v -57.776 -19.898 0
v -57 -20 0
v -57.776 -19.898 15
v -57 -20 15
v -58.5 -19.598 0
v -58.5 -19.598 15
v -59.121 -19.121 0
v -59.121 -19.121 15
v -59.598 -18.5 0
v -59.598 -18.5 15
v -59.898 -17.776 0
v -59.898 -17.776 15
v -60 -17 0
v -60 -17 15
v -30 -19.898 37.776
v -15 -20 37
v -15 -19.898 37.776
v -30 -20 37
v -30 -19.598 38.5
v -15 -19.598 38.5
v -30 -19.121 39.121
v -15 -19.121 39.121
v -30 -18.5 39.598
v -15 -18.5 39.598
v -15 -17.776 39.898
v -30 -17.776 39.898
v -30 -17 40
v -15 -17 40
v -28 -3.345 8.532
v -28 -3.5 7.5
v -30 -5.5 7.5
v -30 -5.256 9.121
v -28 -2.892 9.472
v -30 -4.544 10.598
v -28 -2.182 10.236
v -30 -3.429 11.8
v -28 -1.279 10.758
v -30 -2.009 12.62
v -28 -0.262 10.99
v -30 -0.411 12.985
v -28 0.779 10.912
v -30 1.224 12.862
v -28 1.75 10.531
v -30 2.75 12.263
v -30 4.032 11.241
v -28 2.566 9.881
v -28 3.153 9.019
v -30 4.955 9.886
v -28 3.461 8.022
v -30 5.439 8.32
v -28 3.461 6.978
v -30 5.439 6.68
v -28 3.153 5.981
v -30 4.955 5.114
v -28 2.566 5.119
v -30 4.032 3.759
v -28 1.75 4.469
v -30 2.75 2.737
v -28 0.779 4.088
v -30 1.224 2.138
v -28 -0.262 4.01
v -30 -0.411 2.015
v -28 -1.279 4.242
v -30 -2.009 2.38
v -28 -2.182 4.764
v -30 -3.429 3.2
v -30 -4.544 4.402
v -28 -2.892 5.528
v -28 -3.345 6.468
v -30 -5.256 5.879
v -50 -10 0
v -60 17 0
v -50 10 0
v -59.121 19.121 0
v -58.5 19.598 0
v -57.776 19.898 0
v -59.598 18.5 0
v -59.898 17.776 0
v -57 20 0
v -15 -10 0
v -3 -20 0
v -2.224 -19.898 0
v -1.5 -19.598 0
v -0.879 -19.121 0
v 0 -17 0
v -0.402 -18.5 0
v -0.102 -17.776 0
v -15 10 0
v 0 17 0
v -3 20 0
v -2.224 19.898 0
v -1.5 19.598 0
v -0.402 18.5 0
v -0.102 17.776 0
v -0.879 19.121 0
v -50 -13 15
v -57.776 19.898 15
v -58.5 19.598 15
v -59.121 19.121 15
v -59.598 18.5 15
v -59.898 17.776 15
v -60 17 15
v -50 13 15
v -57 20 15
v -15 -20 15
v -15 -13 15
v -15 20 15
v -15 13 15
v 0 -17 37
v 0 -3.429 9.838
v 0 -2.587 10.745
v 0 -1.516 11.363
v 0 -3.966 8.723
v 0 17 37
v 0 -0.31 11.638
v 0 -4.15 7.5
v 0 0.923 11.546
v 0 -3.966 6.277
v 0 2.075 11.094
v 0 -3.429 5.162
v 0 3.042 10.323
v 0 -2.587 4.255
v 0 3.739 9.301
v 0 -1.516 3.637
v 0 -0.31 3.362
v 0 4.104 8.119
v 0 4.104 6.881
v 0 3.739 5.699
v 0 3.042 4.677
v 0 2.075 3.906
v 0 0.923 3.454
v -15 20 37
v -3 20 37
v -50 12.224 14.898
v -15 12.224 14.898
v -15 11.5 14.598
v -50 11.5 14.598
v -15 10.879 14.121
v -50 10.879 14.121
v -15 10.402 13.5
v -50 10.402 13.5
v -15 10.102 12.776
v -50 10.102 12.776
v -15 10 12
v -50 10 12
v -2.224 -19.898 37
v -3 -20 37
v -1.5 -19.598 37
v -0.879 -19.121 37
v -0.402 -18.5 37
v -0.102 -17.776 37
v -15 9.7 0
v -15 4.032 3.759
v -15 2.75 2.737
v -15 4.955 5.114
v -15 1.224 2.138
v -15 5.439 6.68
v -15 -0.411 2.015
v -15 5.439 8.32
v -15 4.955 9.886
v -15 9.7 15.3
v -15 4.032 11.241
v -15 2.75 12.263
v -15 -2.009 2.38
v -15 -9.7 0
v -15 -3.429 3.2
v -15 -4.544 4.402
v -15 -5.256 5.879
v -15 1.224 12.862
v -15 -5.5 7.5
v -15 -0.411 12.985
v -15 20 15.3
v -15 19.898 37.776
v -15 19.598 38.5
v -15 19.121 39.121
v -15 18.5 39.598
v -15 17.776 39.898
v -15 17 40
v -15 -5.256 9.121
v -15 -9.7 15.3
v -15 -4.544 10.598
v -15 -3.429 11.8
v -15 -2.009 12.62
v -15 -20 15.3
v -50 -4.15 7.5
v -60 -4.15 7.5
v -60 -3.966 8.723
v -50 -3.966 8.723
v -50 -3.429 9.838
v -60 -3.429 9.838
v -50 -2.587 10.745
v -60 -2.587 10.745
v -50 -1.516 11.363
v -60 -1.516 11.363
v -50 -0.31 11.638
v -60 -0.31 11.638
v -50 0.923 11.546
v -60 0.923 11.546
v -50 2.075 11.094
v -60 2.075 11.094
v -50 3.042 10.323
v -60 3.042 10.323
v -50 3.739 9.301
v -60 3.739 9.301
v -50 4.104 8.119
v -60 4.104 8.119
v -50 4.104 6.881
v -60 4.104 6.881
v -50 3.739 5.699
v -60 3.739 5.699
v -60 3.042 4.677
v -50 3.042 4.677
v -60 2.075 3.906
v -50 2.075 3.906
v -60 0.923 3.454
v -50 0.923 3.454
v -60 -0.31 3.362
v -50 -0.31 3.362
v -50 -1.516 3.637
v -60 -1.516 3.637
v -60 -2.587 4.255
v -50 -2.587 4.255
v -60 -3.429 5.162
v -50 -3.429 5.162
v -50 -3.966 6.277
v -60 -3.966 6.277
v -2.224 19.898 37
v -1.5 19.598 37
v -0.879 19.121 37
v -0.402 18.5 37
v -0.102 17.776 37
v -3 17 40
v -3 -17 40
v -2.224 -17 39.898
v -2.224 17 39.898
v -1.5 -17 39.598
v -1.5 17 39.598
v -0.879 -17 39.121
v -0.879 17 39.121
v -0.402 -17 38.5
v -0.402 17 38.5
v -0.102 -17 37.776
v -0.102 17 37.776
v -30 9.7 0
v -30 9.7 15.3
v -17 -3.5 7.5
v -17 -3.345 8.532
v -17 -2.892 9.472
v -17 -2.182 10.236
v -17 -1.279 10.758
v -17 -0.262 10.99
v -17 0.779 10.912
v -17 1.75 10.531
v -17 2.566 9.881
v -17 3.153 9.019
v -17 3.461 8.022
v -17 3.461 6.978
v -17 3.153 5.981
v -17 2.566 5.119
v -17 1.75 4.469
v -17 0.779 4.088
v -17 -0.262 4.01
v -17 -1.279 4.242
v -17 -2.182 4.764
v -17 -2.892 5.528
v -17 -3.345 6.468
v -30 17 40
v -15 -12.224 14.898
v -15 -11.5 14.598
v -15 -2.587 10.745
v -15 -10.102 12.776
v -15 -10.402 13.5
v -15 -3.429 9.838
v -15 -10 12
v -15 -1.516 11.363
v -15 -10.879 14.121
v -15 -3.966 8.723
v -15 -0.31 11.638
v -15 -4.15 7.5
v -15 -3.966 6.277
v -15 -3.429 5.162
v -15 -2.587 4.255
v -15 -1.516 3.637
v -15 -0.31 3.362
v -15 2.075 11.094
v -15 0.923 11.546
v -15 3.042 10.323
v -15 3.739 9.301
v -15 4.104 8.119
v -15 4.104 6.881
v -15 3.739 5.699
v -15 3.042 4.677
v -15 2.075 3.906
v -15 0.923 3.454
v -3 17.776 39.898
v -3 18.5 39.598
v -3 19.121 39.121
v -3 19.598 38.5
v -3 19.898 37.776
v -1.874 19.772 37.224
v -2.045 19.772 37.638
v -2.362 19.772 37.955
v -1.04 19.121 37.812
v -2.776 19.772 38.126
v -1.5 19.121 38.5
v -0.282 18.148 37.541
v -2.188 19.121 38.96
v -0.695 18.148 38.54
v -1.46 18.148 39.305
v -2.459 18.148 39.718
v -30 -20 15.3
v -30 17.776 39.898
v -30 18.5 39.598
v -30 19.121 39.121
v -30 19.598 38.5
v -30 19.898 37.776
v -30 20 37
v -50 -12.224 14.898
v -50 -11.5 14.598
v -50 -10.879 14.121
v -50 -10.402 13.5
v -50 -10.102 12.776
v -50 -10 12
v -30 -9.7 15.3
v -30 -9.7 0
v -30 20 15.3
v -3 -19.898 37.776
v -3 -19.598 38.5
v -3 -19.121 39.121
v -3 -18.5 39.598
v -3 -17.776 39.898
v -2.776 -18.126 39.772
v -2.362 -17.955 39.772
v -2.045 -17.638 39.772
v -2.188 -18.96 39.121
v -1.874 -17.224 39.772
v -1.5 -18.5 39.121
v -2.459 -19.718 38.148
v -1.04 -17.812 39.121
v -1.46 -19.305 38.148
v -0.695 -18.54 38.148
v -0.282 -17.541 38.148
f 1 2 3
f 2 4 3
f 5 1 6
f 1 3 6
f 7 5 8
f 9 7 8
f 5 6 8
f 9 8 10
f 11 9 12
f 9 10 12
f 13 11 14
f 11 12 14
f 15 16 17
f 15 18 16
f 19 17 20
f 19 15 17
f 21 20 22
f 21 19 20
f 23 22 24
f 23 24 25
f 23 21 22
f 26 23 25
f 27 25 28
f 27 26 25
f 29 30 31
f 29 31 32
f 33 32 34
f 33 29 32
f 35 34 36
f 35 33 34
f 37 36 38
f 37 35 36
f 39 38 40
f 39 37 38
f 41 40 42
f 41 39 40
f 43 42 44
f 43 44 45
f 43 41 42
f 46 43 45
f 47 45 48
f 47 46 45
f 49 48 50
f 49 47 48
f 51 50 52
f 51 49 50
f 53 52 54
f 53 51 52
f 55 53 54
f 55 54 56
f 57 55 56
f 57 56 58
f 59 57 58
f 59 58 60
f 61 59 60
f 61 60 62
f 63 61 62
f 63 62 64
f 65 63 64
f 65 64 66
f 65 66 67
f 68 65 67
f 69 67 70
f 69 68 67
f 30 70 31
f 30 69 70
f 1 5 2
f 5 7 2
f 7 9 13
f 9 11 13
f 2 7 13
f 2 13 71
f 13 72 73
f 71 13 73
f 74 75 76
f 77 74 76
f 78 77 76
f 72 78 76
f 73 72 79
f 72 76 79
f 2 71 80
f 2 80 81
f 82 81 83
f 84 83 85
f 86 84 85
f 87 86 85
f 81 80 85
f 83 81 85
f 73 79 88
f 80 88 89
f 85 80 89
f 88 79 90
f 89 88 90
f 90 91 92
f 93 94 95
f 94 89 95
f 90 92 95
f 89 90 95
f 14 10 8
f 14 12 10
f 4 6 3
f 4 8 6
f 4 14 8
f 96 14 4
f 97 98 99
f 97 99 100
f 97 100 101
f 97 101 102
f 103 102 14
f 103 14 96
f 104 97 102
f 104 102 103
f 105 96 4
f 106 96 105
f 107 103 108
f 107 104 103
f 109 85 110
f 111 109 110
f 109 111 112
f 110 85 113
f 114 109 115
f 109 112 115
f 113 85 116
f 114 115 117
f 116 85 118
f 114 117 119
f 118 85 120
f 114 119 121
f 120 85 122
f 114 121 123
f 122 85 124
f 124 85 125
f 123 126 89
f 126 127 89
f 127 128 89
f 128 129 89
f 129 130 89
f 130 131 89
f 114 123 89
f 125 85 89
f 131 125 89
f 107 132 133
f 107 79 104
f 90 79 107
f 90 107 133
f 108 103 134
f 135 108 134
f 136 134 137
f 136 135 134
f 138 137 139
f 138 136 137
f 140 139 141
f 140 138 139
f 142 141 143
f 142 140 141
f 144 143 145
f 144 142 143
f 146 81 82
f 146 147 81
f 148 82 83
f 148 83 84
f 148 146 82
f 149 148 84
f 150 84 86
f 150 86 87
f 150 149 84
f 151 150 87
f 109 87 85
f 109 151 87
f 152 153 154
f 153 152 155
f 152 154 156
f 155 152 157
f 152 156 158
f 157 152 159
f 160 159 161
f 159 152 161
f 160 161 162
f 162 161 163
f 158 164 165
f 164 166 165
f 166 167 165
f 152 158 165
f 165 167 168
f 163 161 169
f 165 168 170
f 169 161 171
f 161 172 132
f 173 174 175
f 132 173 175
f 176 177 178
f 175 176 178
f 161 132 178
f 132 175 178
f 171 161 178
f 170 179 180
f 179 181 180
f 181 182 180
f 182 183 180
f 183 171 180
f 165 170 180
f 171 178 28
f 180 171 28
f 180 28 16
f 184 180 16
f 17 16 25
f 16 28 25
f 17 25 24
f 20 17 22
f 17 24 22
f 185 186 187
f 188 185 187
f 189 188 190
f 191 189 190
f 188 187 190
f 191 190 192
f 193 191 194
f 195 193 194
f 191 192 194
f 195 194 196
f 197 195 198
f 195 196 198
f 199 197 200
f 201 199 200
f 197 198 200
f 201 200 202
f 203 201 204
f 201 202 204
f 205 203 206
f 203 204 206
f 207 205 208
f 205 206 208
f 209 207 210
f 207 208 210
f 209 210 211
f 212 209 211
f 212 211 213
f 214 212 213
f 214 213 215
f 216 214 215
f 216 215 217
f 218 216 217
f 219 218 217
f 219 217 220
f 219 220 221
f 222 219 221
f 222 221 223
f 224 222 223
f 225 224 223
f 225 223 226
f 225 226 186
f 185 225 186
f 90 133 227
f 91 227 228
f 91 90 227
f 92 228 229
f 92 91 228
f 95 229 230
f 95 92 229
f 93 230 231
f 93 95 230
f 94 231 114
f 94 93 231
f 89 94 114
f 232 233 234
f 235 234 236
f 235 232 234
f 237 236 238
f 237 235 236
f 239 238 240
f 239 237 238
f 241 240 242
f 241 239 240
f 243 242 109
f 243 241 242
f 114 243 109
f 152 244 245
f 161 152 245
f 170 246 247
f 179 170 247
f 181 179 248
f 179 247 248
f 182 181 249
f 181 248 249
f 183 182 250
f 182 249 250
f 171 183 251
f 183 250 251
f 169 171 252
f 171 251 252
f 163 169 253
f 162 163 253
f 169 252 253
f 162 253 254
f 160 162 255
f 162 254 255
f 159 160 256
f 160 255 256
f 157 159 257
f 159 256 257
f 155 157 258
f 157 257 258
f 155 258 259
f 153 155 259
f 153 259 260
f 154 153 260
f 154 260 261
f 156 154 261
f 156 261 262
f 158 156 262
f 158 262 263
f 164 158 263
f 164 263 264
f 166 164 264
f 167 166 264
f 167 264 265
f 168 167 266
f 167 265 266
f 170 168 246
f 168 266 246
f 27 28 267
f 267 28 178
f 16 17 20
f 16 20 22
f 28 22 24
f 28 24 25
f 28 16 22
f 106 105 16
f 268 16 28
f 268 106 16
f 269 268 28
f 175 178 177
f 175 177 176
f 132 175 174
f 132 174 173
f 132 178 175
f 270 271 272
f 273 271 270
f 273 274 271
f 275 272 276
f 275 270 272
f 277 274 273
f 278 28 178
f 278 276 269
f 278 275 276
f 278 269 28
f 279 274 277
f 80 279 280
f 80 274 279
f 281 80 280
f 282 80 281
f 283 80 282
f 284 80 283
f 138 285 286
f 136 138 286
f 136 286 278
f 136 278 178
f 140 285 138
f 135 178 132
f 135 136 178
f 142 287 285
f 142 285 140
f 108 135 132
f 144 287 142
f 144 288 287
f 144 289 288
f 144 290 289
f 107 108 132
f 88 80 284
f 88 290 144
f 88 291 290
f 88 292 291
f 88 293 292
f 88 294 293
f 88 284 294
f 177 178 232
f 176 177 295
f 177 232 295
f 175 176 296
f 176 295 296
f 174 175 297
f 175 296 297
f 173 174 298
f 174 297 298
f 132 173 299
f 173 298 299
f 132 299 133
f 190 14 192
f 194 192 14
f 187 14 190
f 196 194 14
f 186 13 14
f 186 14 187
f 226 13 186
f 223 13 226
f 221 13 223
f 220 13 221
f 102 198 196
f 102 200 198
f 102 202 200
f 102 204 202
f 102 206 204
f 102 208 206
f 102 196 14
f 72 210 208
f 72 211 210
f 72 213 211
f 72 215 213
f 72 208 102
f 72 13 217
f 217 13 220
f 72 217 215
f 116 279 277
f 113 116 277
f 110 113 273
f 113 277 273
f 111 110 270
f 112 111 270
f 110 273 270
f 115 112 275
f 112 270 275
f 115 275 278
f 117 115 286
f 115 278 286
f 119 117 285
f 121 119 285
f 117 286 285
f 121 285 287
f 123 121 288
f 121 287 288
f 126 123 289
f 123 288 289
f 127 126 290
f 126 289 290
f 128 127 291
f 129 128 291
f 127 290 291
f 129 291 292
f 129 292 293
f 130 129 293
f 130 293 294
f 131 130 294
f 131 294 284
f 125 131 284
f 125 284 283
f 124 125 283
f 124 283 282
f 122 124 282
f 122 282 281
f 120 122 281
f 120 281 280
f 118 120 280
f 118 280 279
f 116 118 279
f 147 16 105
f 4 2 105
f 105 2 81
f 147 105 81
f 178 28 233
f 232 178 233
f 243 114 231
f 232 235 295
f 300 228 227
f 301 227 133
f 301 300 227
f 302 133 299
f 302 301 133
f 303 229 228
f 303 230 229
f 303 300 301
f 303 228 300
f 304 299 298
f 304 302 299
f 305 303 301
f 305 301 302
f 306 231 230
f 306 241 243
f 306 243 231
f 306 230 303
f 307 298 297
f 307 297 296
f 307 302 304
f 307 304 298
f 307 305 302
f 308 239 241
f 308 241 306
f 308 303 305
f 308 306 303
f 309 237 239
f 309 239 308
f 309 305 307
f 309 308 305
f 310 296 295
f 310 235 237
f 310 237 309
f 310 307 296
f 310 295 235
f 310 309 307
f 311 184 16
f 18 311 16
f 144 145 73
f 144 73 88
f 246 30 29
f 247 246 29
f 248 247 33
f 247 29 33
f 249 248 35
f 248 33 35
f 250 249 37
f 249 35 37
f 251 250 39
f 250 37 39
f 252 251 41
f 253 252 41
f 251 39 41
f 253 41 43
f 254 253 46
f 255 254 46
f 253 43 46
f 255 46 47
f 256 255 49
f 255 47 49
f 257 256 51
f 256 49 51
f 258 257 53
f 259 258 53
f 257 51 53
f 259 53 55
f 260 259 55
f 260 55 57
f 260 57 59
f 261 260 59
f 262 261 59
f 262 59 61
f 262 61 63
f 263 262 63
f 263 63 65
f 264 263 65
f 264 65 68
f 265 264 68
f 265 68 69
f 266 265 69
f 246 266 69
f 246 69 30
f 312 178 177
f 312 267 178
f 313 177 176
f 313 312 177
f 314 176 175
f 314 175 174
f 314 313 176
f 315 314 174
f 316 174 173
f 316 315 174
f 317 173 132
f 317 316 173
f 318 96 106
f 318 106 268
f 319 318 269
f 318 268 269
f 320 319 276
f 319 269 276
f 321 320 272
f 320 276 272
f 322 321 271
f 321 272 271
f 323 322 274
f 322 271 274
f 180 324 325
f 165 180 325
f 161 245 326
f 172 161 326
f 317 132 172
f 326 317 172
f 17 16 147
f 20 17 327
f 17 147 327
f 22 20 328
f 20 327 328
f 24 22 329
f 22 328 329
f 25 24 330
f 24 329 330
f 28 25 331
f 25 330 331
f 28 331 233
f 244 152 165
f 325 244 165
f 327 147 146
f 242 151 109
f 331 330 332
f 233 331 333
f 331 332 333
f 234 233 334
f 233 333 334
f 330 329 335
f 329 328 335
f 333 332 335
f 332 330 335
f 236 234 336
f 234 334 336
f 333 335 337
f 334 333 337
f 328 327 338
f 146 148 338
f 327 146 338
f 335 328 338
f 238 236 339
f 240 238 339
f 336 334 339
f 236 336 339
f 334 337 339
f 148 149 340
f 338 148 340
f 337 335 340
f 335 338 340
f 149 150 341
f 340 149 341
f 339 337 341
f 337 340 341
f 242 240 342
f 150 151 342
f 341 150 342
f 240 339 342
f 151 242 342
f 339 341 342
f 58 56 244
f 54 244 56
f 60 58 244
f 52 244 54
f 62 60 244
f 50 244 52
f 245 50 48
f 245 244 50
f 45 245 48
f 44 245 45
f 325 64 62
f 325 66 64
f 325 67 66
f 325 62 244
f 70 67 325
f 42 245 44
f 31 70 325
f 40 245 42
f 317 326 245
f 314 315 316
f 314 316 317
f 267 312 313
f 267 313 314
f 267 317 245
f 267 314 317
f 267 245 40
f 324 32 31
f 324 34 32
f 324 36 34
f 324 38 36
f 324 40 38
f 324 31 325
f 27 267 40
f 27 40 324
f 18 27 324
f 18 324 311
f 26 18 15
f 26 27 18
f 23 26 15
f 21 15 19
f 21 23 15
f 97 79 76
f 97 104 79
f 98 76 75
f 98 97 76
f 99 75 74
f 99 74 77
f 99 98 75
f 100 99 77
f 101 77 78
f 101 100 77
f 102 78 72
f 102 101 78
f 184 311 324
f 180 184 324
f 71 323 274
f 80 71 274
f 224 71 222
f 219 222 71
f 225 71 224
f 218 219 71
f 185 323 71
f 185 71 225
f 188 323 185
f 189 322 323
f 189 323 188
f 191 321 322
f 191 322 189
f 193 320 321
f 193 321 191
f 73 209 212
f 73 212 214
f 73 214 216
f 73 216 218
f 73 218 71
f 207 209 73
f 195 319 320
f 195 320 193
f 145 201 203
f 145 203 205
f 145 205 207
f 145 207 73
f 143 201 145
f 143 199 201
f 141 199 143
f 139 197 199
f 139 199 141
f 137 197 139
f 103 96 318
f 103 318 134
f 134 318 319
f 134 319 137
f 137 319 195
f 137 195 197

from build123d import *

# Parameters (mm, degrees)
F0_W      = 60
F0_H      = 40
F1_DEPTH  = 15
F2_W      = 15
F2_H      = 40
F3_DEPTH  = 25
F4_W      = 35
F4_H      = 20
F5_DEPTH  = 15.001
F6_R      = 4.15
F7_DEPTH  = 60.001
F9_DEPTH  = 15
F11_DEPTH = 30.001
F12_R     = 3.5
F13_DEPTH = 30.001
F14_SIZE  = 2
F15_R     = 3
F15_2_R   = 3


with BuildPart() as f1:
    # F0 (on Top) → F1 (new body)
    with BuildSketch(Plane.XY):
        with Locations((-30, 0)):
            Rectangle(F0_W, F0_H)
    extrude(amount=F1_DEPTH)

    # F2 (on face) → F3 (join)
    with BuildSketch(Plane.XY.offset(15)):
        with Locations((-7.5, 0)):
            Rectangle(F2_W, F2_H)
    extrude(amount=F3_DEPTH)

    # F4 (on face) → F5 (cut, through all)
    with BuildSketch(Plane.XY.offset(15)):
        with Locations((-32.5, 0)):
            Rectangle(F4_W, F4_H)
    extrude(amount=-F5_DEPTH, mode=Mode.SUBTRACT)

    # F6 (on face) → F7 (cut, through all)
    with BuildSketch(Plane(origin=(-60, 0, 0), x_dir=(0, -1, 0), z_dir=(-1, 0, 0))):
        with Locations((0, 7.5)):
            Circle(F6_R)
    extrude(amount=-F7_DEPTH, mode=Mode.SUBTRACT)

    # F15
    f15_edges = [f1.edges().sort_by_distance(p)[0] for p in [
        (0, -20, 20),
        (-7.5, -20, 40),
        (0, 0, 40),
        (0, 20, 20),
        (-7.5, 20, 40),
        (-60, -20, 7.5),
        (-60, 20, 7.5),
        (-32.5, -10, 15),
        (-32.5, 10, 15),
    ]]
    fillet(f15_edges, radius=F15_R)


with BuildPart() as f9:
    # F8 (on face) → F9 (new body)
    with BuildSketch(Plane(origin=(-15, 0, 0), x_dir=(0, -1, 0), z_dir=(-1, 0, 0))):
        Polygon((20, 40), (-20, 40), (-20, 15), (-10, 15), (-10, 0), (10, 0), (10, 15), (20, 15), align=None)
    extrude(amount=F9_DEPTH)

    # F10 (on face) → F11 (cut, through all)
    with BuildSketch(Plane(origin=(-30, 0, 0), x_dir=(0, -1, 0), z_dir=(-1, 0, 0))):
        Polygon((-9.7, 15.3), (-20, 15.3), (-20, 15), (-10, 15), (-10, 0), (-9.7, 0), align=None)
        Polygon((9.7, 15.3), (9.7, 0), (10, 0), (10, 15), (20, 15), (20, 15.3), align=None)
    extrude(amount=-F11_DEPTH, mode=Mode.SUBTRACT)

    # F12 (on face) → F13 (cut, through all)
    with BuildSketch(Plane(origin=(-30, 0, 0), x_dir=(0, -1, 0), z_dir=(-1, 0, 0))):
        with Locations((0, 7.5)):
            Circle(F12_R)
    extrude(amount=-F13_DEPTH, mode=Mode.SUBTRACT)

    # F14
    f14_edges = [f9.edges().sort_by_distance(p)[0] for p in [
        (-30, 3.5, 7.5),
        (-15, 3.5, 7.5),
    ]]
    chamfer(f14_edges, length=F14_SIZE)

    # F15#2
    f15_2_edges = [f9.edges().sort_by_distance(p)[0] for p in [
        (-22.5, -20, 40),
        (-22.5, 20, 40),
    ]]
    fillet(f15_2_edges, radius=F15_2_R)


solid = Compound([f1.part, f9.part])
